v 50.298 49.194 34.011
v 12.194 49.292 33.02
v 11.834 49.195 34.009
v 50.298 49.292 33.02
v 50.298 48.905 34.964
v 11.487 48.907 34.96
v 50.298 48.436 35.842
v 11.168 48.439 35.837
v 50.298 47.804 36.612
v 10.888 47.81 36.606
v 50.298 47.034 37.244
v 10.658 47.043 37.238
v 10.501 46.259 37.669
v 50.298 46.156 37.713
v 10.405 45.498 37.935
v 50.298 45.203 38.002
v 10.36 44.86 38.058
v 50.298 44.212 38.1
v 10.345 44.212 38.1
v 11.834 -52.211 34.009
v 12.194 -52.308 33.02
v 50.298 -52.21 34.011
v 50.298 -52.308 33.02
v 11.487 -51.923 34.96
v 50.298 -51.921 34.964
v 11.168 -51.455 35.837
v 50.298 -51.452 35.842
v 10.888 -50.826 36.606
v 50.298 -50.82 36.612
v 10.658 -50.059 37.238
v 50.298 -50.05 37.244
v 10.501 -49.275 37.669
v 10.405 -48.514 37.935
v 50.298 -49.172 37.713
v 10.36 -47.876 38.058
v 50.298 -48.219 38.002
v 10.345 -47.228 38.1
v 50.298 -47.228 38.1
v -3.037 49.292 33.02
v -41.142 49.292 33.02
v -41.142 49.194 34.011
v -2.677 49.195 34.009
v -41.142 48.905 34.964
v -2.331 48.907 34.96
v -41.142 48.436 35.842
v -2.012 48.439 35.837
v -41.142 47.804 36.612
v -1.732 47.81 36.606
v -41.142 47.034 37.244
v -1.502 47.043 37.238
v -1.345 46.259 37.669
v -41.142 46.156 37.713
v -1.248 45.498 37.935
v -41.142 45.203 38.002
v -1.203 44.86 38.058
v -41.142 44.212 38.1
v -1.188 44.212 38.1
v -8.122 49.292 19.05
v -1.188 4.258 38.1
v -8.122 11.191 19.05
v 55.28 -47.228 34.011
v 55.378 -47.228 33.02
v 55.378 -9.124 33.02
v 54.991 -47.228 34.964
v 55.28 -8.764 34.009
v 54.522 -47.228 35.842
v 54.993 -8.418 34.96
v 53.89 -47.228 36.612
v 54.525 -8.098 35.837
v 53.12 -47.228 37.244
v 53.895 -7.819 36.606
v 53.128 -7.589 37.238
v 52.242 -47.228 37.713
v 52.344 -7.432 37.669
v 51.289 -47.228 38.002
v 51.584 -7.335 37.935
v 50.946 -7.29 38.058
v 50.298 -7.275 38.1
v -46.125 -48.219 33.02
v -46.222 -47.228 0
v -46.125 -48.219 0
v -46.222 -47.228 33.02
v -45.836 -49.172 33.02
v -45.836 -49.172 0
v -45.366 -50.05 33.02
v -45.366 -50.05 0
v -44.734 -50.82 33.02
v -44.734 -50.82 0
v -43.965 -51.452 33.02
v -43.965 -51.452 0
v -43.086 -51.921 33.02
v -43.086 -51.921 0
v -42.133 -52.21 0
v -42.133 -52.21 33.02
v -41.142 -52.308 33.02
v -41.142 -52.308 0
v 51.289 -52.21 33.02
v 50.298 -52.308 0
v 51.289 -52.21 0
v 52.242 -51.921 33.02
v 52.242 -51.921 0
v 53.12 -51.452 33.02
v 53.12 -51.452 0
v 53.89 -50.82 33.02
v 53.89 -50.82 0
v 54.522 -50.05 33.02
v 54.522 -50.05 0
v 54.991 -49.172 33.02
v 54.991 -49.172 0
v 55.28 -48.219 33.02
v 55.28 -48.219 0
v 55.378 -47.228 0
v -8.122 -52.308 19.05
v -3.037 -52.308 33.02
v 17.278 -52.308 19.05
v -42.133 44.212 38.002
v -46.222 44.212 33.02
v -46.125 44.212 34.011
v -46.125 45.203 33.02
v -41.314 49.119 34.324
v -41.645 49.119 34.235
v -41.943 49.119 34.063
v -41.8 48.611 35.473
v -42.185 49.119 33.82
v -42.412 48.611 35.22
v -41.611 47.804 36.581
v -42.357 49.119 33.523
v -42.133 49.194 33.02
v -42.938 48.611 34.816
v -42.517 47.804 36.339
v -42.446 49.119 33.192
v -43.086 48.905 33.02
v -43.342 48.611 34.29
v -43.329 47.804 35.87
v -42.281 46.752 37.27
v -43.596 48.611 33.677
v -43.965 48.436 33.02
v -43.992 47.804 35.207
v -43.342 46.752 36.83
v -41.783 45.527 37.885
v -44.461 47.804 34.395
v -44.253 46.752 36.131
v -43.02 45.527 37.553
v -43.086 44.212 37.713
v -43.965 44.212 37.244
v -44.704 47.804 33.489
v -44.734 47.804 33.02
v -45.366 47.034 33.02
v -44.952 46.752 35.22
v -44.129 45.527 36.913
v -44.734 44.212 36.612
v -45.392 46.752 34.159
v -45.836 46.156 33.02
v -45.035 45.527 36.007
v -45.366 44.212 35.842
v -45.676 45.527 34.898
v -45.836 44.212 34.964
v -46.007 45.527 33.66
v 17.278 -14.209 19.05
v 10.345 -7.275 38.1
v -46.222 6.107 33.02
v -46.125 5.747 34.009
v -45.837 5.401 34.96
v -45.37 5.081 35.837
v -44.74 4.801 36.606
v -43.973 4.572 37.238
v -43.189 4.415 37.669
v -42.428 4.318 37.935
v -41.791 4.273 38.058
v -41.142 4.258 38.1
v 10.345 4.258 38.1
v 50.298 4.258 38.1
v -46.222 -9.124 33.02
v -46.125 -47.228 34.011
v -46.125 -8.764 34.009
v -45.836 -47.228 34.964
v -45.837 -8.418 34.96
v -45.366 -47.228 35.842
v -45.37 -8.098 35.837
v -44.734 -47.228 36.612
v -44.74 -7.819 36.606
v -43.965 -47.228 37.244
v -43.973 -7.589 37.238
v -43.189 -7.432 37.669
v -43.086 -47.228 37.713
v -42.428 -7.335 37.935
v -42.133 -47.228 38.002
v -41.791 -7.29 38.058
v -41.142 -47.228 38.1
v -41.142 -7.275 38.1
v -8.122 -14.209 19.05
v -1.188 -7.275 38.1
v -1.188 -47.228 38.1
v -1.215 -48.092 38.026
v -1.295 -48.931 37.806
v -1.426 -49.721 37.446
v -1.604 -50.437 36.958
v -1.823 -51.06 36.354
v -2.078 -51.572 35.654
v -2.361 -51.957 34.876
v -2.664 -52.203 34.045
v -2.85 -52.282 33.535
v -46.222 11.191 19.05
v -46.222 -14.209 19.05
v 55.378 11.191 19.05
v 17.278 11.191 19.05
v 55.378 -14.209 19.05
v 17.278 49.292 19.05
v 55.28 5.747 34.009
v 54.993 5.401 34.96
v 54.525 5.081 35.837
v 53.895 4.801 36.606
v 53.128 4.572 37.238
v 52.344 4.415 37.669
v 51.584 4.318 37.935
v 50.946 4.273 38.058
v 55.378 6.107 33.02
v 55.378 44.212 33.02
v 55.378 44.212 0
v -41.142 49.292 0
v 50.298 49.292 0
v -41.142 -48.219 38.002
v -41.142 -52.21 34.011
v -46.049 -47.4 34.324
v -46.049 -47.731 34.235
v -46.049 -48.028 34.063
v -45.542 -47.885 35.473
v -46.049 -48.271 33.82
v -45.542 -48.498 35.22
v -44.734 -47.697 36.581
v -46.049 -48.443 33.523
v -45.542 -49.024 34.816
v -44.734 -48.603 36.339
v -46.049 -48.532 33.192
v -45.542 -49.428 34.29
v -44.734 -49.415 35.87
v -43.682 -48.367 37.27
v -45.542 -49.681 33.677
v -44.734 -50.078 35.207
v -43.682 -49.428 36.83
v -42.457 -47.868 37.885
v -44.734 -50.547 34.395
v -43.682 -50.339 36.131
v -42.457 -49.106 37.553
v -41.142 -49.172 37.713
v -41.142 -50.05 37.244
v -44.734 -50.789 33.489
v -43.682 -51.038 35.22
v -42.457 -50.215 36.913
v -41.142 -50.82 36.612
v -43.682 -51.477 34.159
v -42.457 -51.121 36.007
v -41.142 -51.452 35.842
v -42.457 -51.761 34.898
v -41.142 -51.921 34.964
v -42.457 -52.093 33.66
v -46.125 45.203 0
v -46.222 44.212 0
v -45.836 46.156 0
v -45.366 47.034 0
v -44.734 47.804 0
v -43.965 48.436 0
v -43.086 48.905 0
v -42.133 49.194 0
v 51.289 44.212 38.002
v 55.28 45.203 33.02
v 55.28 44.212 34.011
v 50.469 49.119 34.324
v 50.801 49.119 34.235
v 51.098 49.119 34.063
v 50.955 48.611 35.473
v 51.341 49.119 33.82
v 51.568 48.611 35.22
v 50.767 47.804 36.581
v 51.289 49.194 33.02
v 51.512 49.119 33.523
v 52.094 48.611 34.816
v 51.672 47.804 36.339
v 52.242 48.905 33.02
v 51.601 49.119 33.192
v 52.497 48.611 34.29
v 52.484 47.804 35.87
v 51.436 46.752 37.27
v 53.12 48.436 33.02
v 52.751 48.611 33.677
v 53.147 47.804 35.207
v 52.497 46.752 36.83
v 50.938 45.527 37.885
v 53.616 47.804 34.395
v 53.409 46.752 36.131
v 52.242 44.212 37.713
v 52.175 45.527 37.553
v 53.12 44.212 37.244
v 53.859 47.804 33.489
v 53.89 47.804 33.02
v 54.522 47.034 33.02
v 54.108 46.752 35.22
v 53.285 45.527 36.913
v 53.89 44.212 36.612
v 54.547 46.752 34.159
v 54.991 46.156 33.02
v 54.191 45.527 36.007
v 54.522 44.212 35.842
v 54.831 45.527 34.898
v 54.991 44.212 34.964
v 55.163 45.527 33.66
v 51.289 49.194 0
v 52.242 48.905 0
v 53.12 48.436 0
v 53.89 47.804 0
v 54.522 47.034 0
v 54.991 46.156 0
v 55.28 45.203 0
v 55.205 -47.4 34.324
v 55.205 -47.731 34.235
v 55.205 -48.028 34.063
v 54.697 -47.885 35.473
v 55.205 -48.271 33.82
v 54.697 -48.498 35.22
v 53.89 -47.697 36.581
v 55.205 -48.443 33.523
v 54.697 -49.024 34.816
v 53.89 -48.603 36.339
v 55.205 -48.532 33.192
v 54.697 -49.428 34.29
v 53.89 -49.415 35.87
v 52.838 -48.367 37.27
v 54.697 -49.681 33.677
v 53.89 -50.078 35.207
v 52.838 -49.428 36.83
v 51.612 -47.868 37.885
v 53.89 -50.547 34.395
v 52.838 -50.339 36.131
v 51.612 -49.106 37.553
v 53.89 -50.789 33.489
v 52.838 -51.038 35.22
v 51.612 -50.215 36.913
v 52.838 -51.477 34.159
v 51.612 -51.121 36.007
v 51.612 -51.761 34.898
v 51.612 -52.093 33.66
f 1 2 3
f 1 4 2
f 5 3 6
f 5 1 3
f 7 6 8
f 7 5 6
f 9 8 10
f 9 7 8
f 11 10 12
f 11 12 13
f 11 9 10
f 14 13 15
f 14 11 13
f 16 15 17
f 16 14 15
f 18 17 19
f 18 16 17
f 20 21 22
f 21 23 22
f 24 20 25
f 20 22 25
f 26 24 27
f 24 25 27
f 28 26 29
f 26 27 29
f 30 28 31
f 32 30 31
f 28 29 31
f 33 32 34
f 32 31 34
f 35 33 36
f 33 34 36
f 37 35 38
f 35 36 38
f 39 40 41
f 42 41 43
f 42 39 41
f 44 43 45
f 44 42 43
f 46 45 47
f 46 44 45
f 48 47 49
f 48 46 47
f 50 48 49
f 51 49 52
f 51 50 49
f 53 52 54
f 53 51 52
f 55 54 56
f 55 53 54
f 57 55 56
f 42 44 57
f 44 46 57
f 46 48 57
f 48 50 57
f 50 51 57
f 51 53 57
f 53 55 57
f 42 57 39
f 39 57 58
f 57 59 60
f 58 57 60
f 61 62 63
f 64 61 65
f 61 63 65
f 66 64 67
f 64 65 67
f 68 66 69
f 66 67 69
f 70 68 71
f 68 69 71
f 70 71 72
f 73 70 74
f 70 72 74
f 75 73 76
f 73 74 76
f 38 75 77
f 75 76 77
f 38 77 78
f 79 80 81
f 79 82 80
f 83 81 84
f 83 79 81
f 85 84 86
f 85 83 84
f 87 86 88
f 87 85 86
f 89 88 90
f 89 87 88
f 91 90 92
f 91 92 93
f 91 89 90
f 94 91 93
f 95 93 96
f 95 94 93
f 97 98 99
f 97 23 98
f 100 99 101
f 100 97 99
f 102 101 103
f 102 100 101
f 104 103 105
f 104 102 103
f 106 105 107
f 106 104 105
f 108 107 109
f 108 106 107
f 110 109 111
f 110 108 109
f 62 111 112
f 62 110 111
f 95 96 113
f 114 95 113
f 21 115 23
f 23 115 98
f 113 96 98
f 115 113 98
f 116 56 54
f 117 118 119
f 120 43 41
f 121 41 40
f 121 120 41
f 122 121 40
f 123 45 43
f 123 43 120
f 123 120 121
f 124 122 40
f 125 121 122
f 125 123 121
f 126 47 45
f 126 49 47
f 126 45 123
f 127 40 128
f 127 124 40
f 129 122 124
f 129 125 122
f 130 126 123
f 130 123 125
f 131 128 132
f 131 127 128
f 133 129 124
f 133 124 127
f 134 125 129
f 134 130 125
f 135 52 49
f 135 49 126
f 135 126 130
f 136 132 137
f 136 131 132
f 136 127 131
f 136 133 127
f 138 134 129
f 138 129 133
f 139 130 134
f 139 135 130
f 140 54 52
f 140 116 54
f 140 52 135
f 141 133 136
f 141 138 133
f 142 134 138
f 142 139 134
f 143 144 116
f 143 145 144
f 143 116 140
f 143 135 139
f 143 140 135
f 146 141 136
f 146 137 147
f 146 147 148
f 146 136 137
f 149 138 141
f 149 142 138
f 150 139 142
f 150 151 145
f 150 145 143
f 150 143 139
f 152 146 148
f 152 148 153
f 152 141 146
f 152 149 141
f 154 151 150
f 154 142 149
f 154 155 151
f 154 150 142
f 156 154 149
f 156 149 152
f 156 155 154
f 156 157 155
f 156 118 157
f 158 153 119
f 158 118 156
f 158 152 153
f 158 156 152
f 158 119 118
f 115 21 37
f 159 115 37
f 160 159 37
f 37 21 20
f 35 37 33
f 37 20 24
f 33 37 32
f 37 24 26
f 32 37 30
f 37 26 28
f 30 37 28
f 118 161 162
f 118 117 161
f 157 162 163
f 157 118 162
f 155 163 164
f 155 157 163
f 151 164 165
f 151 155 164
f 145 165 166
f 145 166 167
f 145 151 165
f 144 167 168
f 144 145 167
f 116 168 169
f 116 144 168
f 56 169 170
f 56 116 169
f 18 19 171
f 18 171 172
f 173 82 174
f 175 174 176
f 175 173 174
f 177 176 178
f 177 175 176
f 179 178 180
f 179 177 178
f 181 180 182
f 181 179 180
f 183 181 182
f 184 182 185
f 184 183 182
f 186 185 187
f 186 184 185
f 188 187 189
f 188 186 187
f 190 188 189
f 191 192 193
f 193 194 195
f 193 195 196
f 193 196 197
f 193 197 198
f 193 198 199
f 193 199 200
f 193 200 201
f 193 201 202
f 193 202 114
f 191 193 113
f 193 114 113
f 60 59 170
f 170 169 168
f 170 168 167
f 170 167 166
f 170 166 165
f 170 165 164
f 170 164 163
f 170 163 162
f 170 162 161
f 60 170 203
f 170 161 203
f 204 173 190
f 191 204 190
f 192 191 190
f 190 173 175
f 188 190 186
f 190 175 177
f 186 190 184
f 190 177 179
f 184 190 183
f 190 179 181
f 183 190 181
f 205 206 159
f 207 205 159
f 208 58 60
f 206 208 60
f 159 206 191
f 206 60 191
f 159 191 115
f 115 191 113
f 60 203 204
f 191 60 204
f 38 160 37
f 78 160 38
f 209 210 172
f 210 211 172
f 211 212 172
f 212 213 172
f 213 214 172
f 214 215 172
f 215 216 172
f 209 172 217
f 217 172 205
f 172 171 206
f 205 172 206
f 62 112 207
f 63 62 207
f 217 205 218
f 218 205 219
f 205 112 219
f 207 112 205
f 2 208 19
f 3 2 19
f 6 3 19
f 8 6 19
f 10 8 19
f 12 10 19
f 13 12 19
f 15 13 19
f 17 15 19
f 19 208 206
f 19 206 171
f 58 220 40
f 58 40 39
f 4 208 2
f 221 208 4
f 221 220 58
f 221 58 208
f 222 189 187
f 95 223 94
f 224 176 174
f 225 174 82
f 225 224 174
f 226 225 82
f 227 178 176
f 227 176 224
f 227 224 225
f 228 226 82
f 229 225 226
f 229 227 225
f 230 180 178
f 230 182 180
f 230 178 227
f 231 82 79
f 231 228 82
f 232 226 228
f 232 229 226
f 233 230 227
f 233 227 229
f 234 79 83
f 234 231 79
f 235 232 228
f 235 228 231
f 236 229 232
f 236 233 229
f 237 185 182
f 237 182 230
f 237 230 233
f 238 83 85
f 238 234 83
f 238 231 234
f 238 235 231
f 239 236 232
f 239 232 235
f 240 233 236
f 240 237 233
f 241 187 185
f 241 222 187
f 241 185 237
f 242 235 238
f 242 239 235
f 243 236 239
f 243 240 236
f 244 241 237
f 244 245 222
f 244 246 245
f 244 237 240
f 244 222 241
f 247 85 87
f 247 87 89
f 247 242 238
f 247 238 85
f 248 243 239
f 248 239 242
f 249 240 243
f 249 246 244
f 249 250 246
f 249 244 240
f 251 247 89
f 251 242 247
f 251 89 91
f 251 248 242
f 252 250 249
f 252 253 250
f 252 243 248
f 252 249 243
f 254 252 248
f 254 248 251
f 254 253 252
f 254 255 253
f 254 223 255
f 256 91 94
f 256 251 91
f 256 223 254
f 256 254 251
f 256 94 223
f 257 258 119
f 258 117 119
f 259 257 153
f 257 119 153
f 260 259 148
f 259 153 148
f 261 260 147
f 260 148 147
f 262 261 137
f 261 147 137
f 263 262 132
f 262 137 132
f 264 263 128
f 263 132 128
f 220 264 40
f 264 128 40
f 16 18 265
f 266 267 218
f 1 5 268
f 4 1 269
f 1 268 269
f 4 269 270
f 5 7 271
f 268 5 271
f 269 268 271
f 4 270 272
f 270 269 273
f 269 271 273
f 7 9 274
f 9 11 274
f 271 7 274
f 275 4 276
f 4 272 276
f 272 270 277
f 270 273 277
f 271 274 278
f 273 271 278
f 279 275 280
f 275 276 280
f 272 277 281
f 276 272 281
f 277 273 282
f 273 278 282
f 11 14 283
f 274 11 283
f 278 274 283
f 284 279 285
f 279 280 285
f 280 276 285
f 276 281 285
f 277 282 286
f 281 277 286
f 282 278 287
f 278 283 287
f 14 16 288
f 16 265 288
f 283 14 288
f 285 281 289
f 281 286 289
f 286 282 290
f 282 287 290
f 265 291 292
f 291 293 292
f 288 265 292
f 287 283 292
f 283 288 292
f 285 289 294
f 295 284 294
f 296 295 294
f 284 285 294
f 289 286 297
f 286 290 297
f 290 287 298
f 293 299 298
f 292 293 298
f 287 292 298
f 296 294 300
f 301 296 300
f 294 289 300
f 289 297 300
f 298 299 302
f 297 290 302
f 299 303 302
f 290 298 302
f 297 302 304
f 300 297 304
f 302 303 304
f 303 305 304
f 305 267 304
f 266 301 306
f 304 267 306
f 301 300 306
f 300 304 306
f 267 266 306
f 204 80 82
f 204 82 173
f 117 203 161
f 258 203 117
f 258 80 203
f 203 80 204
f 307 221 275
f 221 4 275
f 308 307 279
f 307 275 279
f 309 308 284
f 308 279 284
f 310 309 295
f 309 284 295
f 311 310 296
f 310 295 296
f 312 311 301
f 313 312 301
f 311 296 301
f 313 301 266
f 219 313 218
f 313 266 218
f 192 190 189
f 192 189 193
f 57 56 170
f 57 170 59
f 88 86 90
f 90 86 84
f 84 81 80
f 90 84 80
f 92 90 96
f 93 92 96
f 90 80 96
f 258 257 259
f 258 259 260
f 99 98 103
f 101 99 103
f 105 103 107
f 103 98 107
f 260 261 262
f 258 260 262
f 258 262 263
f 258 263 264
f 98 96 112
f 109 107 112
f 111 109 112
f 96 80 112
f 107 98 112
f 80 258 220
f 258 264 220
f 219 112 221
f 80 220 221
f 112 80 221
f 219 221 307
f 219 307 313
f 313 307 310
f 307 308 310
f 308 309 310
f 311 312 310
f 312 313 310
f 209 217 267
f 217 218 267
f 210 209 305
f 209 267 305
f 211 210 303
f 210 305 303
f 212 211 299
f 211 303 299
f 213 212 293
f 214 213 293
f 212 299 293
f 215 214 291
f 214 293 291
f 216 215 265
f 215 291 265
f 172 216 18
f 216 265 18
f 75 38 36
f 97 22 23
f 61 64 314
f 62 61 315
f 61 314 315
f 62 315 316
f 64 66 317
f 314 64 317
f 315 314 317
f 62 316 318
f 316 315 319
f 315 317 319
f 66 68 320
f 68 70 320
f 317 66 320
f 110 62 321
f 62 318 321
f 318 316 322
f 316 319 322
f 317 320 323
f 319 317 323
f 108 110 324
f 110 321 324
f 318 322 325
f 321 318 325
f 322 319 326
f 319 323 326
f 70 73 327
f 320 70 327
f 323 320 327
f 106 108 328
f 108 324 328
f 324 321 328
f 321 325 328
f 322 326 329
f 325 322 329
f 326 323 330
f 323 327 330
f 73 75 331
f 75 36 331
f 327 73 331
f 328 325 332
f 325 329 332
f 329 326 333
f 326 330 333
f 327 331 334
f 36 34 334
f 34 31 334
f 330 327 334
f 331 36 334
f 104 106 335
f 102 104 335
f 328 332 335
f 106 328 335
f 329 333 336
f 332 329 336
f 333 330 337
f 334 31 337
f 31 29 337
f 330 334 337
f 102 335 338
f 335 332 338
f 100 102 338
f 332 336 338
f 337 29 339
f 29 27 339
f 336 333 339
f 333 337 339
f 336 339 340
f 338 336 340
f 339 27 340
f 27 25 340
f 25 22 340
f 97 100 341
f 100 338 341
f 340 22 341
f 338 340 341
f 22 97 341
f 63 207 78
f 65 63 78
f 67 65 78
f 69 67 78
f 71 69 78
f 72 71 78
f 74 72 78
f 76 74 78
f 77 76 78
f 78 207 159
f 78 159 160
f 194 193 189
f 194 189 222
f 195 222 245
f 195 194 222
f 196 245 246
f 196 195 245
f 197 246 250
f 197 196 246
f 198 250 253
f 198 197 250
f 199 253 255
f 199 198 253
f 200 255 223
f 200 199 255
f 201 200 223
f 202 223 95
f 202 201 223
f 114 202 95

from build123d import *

# Parameters (mm, degrees)
F0_W     = 101.6
F0_H     = 101.6
F1_DEPTH = 38.1
F3_DEPTH = 101.601
F5_DEPTH = 101.601
F6_R     = 5.08


with BuildPart() as f1:
    # F0 (on Top) → F1 (new body)
    with BuildSketch(Plane.XY):
        with Locations((4.577692, -1.507951)):
            Rectangle(F0_W, F0_H)
    extrude(amount=F1_DEPTH)

    # F2 (on face) → F3 (cut, through all)
    with BuildSketch(Plane.XZ.offset(52.307951)):
        Polygon((10.344626, 38.1), (-1.188108, 38.1), (-8.121741, 19.05), (17.278259, 19.05), align=None)
    extrude(amount=-F3_DEPTH, mode=Mode.SUBTRACT)

    # F4 (on face) → F5 (cut, through all)
    with BuildSketch(Plane(origin=(-46.222308, 0, 0), x_dir=(0, -1, 0), z_dir=(-1, 0, 0))):
        Polygon((7.274885, 38.1), (-4.257849, 38.1), (-11.191482, 19.05), (14.208518, 19.05), align=None)
    extrude(amount=-F5_DEPTH, mode=Mode.SUBTRACT)

    # F6
    f6_edges = [f1.edges().sort_by_distance(p)[0] for p in [
        (32.861159, -52.307951, 38.1),
        (-23.705208, -52.307951, 38.1),
        (-46.222308, -29.791418, 38.1),
        (-46.222308, 26.774949, 38.1),
        (55.377692, 26.774949, 38.1),
        (55.377692, -29.791418, 38.1),
        (-23.705208, 49.292049, 38.1),
        (32.861159, 49.292049, 38.1),
        (-46.222308, -52.307951, 19.05),
        (55.377692, -52.307951, 19.05),
        (-46.222308, 49.292049, 19.05),
        (55.377692, 49.292049, 19.05),
    ]]
    fillet(f6_edges, radius=F6_R)


solid = f1.part
